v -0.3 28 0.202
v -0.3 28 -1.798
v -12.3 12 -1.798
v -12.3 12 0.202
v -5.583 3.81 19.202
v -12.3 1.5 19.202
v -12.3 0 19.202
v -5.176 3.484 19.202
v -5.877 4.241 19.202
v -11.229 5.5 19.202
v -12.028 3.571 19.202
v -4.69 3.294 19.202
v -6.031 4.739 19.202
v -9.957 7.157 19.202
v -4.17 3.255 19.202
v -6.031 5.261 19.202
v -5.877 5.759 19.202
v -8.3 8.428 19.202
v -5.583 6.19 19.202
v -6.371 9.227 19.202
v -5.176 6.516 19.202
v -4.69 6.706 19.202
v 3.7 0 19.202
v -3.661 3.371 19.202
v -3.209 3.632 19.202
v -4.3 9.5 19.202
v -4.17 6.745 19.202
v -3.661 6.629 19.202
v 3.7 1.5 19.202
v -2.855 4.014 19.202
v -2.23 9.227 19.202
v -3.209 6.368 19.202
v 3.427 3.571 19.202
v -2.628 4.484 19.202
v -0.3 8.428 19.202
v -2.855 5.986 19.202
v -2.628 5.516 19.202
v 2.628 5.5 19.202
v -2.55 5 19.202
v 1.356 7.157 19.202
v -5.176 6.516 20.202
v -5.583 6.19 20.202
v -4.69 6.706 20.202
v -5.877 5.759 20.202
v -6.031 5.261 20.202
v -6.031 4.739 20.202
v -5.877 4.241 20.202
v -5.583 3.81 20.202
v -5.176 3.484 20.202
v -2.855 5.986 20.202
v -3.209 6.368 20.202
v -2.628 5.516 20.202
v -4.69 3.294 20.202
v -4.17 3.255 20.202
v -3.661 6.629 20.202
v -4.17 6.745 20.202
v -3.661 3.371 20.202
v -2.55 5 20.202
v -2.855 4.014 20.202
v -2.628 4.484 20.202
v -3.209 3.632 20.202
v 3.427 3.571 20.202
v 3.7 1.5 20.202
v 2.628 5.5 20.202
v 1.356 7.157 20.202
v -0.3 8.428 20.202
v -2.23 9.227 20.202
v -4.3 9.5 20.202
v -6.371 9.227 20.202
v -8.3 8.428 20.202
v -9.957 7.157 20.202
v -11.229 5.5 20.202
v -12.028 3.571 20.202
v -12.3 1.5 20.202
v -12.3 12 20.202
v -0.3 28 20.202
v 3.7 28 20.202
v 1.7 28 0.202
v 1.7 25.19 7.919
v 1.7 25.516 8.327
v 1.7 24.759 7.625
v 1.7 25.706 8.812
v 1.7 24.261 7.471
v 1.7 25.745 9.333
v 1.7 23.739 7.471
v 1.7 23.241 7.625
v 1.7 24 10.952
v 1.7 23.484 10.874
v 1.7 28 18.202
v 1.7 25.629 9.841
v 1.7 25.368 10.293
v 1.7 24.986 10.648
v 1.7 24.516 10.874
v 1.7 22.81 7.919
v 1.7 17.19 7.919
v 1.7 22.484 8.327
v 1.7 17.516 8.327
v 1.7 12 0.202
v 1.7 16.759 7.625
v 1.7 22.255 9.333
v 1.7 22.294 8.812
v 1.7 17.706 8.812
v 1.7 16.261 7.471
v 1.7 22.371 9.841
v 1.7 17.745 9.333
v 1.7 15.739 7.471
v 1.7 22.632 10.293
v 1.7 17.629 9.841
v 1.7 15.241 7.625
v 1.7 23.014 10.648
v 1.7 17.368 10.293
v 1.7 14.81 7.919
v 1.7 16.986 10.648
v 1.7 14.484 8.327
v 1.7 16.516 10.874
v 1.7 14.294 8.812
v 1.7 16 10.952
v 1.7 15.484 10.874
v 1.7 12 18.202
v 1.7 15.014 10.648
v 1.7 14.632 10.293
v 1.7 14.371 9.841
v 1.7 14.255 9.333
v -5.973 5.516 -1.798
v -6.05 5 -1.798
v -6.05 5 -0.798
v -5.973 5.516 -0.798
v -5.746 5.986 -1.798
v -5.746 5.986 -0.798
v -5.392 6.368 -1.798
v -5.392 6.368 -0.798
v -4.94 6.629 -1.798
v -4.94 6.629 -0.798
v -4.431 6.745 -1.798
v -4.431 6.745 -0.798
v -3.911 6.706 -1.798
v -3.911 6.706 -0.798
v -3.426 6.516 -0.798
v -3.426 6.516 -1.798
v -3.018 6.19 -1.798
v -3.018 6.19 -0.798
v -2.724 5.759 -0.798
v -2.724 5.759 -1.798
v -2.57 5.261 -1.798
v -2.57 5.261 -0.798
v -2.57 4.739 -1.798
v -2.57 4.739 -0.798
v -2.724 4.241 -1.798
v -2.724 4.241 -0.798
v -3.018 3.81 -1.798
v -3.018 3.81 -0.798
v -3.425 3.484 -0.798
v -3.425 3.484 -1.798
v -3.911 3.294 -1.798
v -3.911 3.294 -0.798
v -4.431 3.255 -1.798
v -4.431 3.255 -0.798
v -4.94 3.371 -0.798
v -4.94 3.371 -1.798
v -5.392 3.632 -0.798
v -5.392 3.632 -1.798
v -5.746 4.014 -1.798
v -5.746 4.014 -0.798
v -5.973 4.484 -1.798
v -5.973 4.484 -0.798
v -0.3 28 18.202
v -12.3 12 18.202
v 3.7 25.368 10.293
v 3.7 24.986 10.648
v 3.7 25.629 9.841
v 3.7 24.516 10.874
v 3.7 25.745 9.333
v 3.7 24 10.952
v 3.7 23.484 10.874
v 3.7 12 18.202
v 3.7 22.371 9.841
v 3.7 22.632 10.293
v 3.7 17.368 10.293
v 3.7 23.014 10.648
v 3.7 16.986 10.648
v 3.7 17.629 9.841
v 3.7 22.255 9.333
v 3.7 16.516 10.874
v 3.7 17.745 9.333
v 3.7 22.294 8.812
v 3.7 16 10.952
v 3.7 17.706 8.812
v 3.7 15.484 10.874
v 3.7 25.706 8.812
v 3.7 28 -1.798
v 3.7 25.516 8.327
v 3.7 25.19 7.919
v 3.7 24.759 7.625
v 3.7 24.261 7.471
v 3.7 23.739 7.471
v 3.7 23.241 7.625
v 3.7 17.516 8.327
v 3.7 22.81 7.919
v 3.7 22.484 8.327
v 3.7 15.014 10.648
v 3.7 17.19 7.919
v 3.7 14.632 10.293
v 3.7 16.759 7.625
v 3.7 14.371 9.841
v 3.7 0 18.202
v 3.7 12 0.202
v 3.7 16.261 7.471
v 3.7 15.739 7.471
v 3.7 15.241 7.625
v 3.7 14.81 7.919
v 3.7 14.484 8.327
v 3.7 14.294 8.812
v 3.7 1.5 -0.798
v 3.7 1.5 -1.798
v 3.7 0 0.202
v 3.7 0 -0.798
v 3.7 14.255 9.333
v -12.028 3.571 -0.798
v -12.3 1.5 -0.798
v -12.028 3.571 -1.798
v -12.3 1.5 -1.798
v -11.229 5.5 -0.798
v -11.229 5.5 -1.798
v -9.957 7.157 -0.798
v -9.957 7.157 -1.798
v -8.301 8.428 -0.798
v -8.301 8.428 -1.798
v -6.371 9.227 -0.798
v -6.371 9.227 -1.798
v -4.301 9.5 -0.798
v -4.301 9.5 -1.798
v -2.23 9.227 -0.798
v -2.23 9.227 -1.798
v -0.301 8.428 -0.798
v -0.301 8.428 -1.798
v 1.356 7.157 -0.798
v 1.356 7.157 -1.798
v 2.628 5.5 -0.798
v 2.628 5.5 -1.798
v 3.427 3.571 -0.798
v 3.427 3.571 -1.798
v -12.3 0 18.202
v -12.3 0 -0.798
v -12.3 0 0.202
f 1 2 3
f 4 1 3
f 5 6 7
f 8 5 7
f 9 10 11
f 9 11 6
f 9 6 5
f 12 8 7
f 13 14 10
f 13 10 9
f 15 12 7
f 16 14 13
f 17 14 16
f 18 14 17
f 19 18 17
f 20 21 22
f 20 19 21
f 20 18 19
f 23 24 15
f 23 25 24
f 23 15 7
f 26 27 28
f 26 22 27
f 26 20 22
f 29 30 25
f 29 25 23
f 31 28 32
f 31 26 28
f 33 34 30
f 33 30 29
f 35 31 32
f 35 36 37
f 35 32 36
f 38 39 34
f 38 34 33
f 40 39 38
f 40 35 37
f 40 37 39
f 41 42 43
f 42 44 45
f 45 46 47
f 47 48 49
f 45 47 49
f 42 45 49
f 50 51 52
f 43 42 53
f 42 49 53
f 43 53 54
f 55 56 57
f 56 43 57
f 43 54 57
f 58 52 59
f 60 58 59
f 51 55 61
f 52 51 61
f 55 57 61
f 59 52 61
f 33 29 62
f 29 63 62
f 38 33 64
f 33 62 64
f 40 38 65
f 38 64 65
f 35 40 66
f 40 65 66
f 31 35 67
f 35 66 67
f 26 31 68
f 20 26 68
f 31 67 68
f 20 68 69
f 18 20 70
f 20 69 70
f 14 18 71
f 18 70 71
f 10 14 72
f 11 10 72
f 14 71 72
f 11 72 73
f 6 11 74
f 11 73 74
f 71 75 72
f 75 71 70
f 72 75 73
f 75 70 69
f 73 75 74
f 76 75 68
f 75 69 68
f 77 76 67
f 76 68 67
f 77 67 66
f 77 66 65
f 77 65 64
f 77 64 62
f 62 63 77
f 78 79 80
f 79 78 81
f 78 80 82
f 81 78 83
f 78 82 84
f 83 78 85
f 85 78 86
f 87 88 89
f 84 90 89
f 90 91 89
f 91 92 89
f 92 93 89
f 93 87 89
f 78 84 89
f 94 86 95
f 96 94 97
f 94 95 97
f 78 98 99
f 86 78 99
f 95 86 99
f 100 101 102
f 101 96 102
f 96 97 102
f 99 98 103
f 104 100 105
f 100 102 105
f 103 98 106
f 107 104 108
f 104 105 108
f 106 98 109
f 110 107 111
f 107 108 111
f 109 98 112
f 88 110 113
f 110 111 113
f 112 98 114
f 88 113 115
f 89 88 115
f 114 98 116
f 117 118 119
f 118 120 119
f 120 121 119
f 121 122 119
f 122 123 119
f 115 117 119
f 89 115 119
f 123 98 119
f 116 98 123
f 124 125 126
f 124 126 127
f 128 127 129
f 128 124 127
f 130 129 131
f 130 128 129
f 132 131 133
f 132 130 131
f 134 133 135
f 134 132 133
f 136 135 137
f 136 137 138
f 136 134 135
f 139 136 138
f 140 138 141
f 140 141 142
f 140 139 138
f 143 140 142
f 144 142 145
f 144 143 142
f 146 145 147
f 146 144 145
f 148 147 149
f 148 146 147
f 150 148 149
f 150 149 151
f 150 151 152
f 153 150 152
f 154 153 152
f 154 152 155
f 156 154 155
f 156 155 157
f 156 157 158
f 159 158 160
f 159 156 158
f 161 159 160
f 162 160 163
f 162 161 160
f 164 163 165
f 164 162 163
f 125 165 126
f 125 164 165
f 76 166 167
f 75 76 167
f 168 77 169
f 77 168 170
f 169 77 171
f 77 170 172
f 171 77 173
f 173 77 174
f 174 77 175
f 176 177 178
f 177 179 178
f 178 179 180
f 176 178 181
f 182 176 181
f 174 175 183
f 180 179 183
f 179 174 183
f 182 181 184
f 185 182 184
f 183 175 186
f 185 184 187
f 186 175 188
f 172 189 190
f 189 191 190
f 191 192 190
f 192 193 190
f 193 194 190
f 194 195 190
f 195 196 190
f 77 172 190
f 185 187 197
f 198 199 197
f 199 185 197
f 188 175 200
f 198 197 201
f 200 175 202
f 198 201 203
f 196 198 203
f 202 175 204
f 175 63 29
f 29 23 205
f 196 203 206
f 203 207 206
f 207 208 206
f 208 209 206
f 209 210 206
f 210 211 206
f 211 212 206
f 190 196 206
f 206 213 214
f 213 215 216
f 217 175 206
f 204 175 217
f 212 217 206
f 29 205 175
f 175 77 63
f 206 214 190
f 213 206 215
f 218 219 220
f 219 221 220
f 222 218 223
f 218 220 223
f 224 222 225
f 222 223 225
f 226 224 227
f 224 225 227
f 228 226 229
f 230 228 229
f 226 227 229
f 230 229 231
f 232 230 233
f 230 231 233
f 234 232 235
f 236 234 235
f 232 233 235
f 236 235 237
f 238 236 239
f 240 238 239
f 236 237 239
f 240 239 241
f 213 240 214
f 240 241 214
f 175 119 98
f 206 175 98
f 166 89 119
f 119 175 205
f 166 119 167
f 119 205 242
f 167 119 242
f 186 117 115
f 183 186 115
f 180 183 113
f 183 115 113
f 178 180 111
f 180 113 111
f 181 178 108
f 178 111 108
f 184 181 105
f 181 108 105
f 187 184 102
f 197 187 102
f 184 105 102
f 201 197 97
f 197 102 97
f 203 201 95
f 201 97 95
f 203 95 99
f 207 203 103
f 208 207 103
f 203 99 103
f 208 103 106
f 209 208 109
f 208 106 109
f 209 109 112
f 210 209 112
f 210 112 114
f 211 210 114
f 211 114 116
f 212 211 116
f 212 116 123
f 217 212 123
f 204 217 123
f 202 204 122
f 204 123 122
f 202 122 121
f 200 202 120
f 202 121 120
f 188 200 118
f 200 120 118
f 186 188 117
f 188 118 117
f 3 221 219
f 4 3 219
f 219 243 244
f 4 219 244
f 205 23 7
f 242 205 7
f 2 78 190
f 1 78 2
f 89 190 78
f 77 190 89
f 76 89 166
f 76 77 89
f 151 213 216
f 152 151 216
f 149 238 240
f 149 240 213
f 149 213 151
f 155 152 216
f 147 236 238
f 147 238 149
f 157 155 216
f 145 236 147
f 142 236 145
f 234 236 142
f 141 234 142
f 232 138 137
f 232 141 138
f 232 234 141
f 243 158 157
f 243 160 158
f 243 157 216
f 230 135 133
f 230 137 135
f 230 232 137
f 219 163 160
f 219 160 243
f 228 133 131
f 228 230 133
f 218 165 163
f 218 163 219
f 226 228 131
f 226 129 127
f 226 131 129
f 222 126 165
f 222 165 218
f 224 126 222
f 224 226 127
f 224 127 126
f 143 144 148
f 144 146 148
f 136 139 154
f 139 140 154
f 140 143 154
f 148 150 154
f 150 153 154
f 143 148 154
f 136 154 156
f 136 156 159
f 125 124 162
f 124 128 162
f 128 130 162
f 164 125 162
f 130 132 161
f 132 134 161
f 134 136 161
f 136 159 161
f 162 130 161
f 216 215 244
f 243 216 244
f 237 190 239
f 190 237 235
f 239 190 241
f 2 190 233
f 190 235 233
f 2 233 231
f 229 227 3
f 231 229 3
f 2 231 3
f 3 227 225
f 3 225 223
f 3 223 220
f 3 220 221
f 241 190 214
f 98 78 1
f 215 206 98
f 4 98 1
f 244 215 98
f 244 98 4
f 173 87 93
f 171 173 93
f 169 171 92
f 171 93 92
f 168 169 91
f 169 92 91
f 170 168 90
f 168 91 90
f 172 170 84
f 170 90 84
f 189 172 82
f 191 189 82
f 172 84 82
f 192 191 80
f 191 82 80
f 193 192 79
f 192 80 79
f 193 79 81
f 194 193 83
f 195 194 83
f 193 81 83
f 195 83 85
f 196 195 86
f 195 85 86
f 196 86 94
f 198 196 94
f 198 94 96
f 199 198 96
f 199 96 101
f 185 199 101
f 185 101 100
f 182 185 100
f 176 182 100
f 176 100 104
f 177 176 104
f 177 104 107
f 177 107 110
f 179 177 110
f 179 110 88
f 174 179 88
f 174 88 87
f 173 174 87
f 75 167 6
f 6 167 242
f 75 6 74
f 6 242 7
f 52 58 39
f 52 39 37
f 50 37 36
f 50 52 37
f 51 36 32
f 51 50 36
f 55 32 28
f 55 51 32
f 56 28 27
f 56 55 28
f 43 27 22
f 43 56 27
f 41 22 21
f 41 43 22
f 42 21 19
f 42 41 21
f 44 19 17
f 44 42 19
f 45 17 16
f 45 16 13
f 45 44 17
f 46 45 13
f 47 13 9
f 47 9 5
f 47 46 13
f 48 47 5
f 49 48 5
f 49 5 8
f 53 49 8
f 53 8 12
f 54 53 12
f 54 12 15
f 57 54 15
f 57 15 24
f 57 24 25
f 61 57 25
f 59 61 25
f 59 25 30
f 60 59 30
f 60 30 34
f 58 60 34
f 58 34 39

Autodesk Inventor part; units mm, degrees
ref_plane "YZ Plane" through (0, 0, 0) normal (1, 0, 0) x (0, 1, 0)
ref_plane "XZ Plane" through (0, 0, 0) normal (0, 1, 0) x (-1, 0, 0)
ref_plane "XY Plane" through (0, 0, 0) normal (0, 0, 1) x (1, 0, 0)
sketch "Boceto1" plane through (0, 0, 0) normal (0, 1, 0) x (-1, 0, 0)
  line L0 (10.3005, 0.2018) -> (-1.6995, 0.2018)
  line L1 (-1.6995, 0.2018) -> (-1.6995, 18.2018)
  line L2 (-1.6995, 18.2018) -> (10.3005, 18.2018)
  line L3 (12.3005, 20.2018) -> (-3.6995, 20.2018)
  line L4 (-3.6995, 20.2018) -> (-3.6995, -1.7982)
  line L5 (-3.6995, -1.7982) -> (12.3005, -1.7982)
  line L6 (10.3005, 18.2018) -> (12.3005, 18.2018)
  line L7 (10.3005, 0.2018) -> (12.3005, 0.2018)
  line L8 (12.3005, -1.7982) -> (12.3005, 0.2018)
  line L9 (12.3005, 18.2018) -> (12.3005, 20.2018)
  point P0 (0, 0)
  point P1 (0, 0)
  dimension "d0" = 18
  dimension "d1" = 12
extrude "Extrusión1" add sketch "Boceto1" along normal blind 28
sketch "Boceto2" plane through (-12.3005, 0, 20.2018) normal (0, 0, 1) x (1, 0, 0)
  line L0 (0, 0) -> (0, 1.5)
  line L1 (0, 0) -> (0, 28)
  line L2 (0, 0) -> (14, 0)
  line L3 (16, 0) -> (16, 28)
  line L4 (0, 0) -> (16, 0)
  line L5 (16, 0) -> (16, 1.5)
  arc A0 (16, 1.5) -> (0, 1.5) centre (8, 1.5) ccw
  circle A1 centre (8, 5) radius 1.75
  point P0 (12.3005, 0)
  dimension "d4" = 1.5
  dimension "d5" = 3.5
  dimension "d6" = 5
extrude "Extrusión2" cut sketch "Boceto2" against normal blind 1
sketch "Boceto3" plane through (3.6995, 0, -1.7982) normal (0, 0, -1) x (-1, 0, 0)
  line L0 (0, 0) -> (0, 1.5)
  line L1 (0, 0) -> (0, 25)
  line L2 (0, 0) -> (14, 0)
  line L3 (16, 0) -> (16, 25)
  line L4 (0, 0) -> (16, 0)
  line L5 (16, 0) -> (16, 1.5)
  arc A0 (16, 1.5) -> (0, 1.5) centre (8, 1.5) ccw
  circle A1 centre (8, 5) radius 1.75
  point P0 (3.6995, 0)
  point P1 (12.3005, 0)
  dimension "d9" = 1.5
  dimension "d10" = 3.5
  dimension "d11" = 5
extrude "Extrusión3" cut sketch "Boceto3" against normal blind 1
sketch "Boceto4" plane through (1.6995, 0, 0.2018) normal (-1, 0, 0) x (0, 0, 1)
  line L0 (18, 0) -> (18, 28)
  line L1 (18, 28) -> (18, 12)
  line L2 (18, 12) -> (0, 12)
  line L3 (0, 0) -> (0, 28)
  line L4 (18, 28) -> (0, 28)
  line L5 (0, 28) -> (0, 12)
  line L6 (20, 28) -> (-2, 28)
  line L7 (9, 28) -> (9, 12)
  circle A0 centre (9, 24) radius 1.75
  circle A1 centre (9, 16) radius 1.75
  line L8 (18, 12) -> (18, 0)
  line L9 (0, 0) -> (18, 0)
  line L10 (0, 0) -> (0, 12)
  line L11 (18, 0) -> (0, 0)
  point P0 (-0.2018, 0)
  dimension "d14" = 16
  dimension "d15" = 3.5
  dimension "d16" = 3.5
  dimension "d17" = 4
  dimension "d18" = 4
extrude "Extrusión4" cut sketch "Boceto4" against normal blind 2 contours L9 L3 L2 L0 | A1 L7 | L7 A1 | A0 L7 | L7 A0
sketch "Boceto5" plane through (3.6995, 28, -1.7982) normal (0, 0, -1) x (-1, 0, 0)
  line L0 (0, -26.5) -> (0, 0)
  line L1 (0, 0) -> (4, 0)
  line L2 (16, 0) -> (0, 0)
  line L3 (0, 0) -> (0, -16)
  line L4 (0, -16) -> (16, -16)
  line L5 (16, -26.5) -> (16, 0)
  line L6 (4, 0) -> (16, -16)
  line L7 (4, 0) -> (4, -16)
  point P0 (3.6995, -28)
  dimension "d21" = 4
  dimension "d22" = 16
extrude "Extrusión5" cut sketch "Boceto5" against normal blind 30 contours L2 L5 L6
properties part number "Kit de Sujeción 1"
